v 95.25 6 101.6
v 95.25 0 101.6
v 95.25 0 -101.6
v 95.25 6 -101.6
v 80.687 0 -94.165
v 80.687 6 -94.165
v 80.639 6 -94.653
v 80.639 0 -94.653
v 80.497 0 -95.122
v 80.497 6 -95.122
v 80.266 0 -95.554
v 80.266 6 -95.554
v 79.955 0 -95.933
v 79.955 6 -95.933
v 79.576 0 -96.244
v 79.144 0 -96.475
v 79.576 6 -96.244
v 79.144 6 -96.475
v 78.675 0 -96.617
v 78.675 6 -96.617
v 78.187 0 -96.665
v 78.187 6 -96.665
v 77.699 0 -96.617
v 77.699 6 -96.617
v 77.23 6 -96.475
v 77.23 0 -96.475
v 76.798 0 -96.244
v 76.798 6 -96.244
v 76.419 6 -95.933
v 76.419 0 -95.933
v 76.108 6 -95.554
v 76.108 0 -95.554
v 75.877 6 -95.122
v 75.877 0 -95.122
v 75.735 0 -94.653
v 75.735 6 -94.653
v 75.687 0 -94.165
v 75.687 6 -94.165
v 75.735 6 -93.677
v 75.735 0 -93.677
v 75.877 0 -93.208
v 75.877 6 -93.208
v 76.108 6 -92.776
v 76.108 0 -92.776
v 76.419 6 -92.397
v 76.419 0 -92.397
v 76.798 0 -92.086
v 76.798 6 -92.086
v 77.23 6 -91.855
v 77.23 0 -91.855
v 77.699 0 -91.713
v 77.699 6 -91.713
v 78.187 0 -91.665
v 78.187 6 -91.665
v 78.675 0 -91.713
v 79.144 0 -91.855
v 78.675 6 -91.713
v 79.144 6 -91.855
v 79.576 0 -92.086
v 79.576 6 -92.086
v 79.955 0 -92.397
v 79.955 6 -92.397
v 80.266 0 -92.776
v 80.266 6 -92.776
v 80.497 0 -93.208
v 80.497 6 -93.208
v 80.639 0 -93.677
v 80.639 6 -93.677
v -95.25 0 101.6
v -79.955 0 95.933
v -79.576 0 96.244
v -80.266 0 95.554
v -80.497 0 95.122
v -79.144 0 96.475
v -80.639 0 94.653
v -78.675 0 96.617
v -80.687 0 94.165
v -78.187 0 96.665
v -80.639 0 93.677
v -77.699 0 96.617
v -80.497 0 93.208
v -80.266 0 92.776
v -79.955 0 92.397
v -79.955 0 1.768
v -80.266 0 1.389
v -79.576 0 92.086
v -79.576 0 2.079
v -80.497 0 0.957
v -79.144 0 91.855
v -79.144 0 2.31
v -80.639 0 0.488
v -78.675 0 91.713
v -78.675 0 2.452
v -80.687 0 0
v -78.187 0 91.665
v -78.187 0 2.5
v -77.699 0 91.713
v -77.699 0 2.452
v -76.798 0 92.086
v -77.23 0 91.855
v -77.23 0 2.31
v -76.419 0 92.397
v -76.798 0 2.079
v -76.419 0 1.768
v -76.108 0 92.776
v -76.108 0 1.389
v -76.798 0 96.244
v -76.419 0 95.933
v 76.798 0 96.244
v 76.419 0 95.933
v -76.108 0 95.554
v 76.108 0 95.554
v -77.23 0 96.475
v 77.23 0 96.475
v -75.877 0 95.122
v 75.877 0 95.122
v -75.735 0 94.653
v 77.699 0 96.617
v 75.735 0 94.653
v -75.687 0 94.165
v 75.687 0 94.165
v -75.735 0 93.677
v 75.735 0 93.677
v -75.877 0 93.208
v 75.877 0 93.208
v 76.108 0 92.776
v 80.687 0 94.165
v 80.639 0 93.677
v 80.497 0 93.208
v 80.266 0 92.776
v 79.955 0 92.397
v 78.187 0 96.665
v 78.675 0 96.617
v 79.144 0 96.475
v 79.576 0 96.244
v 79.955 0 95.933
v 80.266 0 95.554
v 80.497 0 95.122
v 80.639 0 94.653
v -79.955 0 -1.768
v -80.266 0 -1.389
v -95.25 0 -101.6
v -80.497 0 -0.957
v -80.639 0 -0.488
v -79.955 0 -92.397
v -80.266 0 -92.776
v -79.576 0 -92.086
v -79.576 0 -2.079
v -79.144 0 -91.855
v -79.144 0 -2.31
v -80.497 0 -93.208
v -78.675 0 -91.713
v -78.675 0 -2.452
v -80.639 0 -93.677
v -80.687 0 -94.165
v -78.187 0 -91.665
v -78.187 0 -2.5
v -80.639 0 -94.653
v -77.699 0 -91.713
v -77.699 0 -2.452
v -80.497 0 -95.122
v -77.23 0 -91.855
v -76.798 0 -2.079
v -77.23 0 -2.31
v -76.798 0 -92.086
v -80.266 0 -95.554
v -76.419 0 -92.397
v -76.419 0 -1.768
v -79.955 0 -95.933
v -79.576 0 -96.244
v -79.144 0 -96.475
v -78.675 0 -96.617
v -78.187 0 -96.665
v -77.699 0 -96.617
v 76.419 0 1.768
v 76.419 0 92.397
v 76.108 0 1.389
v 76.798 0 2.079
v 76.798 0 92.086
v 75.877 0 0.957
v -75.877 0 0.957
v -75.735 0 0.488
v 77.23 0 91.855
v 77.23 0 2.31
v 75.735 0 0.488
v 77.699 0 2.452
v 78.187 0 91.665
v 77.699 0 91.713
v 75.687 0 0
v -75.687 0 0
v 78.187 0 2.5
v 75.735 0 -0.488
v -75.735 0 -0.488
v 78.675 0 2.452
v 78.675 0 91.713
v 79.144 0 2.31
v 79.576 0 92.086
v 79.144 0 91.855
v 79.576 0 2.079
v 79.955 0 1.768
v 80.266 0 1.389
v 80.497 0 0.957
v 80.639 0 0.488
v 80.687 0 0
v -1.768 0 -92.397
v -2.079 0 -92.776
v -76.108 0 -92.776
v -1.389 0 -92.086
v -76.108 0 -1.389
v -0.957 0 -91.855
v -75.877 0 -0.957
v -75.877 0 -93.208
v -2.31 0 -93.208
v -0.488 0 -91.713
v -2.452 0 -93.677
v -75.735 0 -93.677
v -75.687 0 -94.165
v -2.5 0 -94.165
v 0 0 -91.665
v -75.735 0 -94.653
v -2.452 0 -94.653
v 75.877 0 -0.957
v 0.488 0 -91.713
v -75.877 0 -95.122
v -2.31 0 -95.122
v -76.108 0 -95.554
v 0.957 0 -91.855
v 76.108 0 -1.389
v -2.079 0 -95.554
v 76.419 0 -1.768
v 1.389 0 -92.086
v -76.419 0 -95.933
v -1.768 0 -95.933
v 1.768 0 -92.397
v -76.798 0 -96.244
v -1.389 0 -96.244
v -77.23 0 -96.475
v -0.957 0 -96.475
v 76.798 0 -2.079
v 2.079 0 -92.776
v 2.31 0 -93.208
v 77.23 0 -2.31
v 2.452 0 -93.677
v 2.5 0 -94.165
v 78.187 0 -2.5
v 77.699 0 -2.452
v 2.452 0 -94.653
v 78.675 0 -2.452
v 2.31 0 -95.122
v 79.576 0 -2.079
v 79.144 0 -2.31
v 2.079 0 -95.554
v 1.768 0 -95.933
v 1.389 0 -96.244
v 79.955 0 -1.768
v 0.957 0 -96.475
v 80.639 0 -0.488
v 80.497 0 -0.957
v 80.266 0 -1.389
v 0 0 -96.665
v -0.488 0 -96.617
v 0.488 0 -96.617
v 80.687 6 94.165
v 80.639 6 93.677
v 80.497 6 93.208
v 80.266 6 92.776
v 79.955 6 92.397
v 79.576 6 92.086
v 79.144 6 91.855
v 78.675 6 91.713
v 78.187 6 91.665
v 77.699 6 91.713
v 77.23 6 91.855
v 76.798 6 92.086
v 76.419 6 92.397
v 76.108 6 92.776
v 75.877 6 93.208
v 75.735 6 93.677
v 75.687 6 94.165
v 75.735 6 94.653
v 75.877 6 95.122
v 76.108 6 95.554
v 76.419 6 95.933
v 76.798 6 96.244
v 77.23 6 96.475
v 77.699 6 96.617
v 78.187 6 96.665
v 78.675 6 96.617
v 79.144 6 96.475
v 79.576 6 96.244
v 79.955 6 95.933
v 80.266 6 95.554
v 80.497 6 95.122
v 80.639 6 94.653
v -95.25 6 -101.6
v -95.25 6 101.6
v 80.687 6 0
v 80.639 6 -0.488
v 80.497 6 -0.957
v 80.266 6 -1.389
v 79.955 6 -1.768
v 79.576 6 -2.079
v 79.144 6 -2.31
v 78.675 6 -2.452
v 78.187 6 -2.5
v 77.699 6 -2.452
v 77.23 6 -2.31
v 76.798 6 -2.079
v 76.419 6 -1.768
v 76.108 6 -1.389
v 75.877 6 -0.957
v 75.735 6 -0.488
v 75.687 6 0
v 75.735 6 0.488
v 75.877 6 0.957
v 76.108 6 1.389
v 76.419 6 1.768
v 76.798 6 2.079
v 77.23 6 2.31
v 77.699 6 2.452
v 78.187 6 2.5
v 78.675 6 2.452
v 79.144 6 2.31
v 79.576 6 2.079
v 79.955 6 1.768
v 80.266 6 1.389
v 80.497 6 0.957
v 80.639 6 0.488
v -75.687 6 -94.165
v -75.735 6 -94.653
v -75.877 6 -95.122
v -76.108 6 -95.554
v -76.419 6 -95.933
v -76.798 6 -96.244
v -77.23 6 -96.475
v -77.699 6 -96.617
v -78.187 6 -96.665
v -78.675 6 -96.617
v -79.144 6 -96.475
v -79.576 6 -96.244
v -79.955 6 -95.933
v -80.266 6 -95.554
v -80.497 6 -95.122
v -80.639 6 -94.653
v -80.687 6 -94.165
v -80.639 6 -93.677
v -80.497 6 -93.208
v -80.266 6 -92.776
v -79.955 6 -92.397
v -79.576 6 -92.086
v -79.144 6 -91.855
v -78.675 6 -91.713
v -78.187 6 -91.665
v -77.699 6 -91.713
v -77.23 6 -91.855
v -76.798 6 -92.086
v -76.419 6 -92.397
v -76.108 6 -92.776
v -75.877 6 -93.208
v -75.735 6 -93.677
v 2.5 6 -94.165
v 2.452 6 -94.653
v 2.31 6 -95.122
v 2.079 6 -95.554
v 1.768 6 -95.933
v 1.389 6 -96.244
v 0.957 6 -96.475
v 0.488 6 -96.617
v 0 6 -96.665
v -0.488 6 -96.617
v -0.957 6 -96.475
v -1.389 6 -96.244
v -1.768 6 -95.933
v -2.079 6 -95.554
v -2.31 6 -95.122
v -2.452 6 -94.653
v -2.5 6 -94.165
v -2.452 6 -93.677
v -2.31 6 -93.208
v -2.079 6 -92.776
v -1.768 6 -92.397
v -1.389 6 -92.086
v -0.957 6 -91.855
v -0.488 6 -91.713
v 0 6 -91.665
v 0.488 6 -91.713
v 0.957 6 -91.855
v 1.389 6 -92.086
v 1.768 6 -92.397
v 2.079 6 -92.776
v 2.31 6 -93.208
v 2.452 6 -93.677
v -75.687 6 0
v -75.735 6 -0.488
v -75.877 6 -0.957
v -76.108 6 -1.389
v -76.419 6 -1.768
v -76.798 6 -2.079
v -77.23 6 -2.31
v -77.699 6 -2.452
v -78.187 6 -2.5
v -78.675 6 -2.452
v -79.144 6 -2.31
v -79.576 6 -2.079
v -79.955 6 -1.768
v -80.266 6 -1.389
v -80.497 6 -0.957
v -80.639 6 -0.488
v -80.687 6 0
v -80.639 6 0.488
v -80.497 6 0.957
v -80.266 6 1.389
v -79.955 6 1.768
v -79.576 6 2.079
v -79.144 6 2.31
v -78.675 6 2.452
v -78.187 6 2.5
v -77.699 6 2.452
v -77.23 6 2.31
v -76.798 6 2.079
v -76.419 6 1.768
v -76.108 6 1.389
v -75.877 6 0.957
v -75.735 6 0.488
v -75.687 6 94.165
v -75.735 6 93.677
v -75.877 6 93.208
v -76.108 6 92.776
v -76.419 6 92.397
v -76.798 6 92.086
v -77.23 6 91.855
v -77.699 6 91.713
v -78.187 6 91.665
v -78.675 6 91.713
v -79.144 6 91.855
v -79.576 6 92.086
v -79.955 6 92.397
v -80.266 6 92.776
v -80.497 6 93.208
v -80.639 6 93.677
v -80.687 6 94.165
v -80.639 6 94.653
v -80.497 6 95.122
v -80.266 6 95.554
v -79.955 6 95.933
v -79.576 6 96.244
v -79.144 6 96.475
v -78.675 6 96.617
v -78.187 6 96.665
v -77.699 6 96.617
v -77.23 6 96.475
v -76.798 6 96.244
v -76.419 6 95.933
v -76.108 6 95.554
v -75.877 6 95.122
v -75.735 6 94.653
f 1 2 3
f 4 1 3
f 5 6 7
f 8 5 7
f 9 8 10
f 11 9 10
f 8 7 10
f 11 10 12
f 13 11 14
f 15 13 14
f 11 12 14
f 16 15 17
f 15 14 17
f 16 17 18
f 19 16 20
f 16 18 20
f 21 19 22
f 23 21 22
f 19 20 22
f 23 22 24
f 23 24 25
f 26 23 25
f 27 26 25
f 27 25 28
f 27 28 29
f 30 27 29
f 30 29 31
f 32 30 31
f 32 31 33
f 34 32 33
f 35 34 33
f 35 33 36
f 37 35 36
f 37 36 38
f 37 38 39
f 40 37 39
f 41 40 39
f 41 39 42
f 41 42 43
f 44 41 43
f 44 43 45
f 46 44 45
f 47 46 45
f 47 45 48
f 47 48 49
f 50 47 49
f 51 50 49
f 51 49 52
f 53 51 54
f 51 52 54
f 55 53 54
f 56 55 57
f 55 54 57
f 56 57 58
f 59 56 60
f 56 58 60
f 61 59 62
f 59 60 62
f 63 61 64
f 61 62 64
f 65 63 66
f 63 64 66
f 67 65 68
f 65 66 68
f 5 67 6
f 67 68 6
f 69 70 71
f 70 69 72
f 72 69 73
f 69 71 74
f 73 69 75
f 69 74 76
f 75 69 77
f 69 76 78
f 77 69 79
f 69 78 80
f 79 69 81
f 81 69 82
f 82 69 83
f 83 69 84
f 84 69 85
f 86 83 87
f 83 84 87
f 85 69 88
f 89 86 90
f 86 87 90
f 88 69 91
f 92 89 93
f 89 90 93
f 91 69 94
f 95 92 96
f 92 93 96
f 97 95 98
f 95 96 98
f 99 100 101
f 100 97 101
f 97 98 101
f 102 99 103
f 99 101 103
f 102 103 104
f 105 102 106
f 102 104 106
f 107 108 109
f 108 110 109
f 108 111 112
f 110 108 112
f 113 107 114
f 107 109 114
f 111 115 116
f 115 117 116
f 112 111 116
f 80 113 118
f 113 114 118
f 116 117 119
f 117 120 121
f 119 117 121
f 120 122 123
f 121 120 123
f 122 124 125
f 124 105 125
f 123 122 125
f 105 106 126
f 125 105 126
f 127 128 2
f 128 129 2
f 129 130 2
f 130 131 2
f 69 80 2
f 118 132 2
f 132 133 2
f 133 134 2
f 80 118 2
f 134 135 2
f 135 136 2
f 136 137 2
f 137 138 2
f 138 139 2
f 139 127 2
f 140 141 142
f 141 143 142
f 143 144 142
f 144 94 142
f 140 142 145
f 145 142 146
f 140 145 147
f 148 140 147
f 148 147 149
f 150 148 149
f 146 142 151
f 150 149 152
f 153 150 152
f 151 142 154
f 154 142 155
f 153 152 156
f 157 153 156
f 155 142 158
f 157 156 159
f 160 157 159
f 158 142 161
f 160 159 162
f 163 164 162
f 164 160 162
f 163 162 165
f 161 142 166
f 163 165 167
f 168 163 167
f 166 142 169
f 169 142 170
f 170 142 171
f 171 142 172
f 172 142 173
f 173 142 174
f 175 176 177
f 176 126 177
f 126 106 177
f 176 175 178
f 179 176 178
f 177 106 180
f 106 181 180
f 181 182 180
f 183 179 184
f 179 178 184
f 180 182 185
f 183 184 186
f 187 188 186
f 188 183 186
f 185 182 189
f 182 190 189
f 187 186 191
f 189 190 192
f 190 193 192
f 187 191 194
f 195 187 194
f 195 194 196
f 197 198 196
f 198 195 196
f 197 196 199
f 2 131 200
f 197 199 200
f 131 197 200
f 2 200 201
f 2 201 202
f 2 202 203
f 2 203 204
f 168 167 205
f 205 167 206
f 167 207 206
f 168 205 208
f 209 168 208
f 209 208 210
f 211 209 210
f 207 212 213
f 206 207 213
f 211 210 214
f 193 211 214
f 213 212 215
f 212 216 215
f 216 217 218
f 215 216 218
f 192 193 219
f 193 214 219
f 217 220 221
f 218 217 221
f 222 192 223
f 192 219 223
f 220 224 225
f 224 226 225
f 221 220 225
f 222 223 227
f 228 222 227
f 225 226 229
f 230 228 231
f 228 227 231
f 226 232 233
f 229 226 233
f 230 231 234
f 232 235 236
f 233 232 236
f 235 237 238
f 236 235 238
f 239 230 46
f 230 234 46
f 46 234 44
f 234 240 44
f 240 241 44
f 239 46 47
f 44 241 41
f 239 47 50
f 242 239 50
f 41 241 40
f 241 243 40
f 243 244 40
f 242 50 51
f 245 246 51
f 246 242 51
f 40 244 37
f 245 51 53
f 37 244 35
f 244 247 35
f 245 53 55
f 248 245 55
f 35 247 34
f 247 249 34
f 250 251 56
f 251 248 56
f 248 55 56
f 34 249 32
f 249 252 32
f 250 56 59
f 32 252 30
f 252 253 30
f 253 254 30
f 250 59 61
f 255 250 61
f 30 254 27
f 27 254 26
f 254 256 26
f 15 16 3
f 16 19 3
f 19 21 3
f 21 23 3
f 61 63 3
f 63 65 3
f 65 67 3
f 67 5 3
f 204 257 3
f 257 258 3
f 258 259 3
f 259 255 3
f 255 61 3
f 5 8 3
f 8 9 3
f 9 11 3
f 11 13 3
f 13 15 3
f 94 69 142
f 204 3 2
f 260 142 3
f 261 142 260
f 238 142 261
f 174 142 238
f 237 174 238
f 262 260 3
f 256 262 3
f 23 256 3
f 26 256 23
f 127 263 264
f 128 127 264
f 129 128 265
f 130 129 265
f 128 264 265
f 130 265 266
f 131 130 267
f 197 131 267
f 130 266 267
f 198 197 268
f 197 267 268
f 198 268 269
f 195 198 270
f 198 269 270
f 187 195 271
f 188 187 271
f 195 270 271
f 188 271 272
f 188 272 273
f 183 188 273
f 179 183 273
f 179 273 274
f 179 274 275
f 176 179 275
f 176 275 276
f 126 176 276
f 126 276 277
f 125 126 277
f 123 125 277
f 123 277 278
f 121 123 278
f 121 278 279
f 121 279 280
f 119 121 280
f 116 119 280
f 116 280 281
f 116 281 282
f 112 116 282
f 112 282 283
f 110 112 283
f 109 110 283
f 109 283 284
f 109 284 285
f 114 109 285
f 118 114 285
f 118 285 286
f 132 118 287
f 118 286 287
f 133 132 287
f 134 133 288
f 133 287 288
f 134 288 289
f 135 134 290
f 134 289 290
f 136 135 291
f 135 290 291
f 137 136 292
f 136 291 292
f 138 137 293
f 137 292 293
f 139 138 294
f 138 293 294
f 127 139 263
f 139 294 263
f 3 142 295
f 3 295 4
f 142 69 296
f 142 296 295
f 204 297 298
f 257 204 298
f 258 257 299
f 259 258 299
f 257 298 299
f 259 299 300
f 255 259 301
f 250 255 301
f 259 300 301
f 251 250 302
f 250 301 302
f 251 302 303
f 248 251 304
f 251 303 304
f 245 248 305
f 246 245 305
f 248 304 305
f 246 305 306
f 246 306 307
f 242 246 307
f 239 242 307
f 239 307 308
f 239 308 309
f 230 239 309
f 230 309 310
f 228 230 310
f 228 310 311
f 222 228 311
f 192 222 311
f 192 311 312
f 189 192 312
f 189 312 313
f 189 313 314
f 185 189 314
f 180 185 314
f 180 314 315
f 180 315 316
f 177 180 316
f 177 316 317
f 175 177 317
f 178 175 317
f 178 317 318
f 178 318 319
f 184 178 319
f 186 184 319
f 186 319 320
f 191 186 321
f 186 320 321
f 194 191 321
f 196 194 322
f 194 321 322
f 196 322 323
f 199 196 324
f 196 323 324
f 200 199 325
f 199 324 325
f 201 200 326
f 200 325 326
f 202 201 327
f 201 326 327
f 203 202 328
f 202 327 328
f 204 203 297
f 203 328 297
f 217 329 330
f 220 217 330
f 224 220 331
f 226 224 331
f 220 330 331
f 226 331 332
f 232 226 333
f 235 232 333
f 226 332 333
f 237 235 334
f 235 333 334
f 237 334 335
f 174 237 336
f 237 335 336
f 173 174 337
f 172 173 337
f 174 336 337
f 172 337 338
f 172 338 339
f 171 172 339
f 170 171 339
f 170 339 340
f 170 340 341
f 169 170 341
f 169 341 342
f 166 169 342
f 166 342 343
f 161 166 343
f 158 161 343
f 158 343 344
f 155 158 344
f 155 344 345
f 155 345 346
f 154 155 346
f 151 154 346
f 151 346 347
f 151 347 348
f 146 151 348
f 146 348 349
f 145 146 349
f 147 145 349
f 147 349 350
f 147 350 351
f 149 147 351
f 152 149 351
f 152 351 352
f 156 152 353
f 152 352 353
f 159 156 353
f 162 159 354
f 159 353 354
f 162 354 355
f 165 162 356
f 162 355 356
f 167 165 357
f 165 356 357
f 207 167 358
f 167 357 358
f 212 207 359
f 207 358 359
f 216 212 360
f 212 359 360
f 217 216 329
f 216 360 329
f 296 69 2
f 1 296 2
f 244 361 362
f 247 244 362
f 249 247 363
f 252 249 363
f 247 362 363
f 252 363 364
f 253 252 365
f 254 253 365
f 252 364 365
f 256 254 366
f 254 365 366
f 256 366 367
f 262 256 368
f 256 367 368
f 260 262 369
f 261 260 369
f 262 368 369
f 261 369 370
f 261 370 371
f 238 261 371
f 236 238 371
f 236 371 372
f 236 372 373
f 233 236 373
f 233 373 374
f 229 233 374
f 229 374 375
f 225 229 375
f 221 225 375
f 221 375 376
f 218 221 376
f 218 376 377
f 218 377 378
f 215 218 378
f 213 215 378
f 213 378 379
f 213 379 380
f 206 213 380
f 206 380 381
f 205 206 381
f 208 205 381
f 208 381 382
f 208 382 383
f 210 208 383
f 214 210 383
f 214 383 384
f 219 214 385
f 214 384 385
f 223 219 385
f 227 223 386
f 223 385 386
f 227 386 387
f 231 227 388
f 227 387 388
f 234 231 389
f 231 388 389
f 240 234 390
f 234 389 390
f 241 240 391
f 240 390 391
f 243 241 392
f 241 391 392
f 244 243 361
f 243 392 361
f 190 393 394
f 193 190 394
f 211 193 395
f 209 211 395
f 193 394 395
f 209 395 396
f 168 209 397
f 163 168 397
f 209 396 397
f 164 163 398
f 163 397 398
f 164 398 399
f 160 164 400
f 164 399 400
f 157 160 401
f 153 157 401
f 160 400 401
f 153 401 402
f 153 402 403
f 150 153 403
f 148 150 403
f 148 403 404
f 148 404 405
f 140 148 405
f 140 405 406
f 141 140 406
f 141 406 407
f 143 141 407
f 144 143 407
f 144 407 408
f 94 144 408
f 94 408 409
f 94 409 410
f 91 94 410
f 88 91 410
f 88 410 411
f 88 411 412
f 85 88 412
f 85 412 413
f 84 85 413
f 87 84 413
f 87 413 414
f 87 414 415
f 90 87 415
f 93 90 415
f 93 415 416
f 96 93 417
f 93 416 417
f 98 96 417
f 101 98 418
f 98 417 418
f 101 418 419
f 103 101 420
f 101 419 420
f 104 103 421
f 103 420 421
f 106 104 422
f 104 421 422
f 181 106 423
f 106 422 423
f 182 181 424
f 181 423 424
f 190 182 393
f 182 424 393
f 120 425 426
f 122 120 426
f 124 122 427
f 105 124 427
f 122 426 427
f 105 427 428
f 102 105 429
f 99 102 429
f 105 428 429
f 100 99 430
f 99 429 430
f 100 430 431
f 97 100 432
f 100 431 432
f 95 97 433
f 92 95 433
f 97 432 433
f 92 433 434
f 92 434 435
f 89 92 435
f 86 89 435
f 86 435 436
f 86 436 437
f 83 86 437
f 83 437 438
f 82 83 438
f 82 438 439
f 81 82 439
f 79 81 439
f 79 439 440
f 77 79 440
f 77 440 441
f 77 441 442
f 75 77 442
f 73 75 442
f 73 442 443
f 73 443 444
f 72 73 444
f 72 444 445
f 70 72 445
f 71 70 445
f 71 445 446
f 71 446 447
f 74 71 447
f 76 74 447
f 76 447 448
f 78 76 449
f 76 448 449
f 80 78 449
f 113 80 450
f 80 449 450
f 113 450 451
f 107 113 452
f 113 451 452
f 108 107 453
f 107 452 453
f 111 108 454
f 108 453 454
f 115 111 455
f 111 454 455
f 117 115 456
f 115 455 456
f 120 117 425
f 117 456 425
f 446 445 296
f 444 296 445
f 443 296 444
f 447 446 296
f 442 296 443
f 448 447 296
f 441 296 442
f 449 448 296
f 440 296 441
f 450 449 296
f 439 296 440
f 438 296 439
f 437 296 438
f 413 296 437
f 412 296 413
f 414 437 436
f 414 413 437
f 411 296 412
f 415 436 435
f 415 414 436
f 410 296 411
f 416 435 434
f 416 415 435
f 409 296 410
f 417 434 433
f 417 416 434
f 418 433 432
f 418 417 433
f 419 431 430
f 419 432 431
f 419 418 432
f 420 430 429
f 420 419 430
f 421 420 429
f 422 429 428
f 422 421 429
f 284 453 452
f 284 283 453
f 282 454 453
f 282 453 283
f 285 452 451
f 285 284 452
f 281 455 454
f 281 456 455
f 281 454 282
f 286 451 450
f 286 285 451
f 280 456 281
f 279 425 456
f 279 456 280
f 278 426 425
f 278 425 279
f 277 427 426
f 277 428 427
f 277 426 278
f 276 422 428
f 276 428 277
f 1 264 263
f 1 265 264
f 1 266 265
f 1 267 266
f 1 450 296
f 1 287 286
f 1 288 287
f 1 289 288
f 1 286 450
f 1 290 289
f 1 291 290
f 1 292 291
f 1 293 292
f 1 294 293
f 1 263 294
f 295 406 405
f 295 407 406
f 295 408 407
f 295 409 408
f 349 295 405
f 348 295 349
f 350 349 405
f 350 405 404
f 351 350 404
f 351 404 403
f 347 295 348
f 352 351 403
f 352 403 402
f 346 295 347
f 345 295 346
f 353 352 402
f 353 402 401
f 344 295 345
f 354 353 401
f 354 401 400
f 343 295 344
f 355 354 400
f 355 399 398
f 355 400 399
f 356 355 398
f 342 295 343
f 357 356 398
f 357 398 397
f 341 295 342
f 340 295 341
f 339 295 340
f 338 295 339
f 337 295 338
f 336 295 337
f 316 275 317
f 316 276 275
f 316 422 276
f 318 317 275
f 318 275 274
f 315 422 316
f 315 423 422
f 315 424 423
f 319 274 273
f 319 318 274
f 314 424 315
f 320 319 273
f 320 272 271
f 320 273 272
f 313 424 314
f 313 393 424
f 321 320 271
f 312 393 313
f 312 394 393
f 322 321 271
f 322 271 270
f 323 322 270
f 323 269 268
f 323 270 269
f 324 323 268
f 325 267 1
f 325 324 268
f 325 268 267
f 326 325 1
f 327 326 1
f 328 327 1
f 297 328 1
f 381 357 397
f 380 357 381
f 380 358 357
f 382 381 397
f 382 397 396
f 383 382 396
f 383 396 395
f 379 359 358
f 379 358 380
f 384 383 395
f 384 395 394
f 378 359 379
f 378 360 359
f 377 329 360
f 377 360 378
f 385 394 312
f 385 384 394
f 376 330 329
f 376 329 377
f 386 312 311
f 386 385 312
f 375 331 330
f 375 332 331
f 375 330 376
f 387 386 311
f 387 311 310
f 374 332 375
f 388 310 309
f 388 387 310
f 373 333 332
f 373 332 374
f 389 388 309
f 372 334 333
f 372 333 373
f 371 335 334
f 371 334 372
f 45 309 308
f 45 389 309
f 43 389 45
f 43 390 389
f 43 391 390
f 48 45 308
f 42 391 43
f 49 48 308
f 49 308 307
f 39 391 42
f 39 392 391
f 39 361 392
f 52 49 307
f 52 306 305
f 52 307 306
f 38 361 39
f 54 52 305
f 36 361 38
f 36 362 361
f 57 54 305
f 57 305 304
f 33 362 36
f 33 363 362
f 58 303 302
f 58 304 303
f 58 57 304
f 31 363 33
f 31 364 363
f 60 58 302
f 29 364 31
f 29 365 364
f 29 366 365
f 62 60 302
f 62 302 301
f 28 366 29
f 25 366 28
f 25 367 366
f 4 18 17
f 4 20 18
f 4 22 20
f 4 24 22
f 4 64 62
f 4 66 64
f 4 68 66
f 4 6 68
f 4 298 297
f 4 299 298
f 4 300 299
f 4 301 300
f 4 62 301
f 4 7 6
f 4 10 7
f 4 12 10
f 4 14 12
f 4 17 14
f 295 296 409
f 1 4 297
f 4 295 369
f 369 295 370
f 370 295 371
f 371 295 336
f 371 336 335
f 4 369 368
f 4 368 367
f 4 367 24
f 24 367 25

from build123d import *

# Parameters (mm, degrees)
SKETCH2_W           = 190.5
SKETCH2_H           = 203.2
BOSS_EXTRUDE1_DEPTH = 6
SKETCH5_R           = 2.5
CUT_EXTRUDE6_DEPTH  = 7


with BuildPart() as part:
    # Sketch2 → Boss-Extrude1 (new body)
    with BuildSketch(Plane(origin=(0, 0, 0), x_dir=(1, 0, 0), z_dir=(0, 1, 0))):
        Rectangle(SKETCH2_W, SKETCH2_H)
    extrude(amount=BOSS_EXTRUDE1_DEPTH)

    # Sketch5 → Cut-Extrude6 (cut, through all)
    with BuildSketch(Plane(origin=(0, 6, 0), x_dir=(1, 0, 0), z_dir=(0, 1, 0))):
        with Locations((-78.187036158, 94.165073798)):
            Circle(SKETCH5_R)
        with Locations((0, 94.165073798)):
            Circle(SKETCH5_R)
        with Locations((78.187036158, 0)):
            Circle(SKETCH5_R)
        with Locations((-78.187036158, 0)):
            Circle(SKETCH5_R)
        with Locations((78.187036158, 94.165073798)):
            Circle(SKETCH5_R)
        with Locations((-78.187036158, -94.165073798)):
            Circle(SKETCH5_R)
        with Locations((78.187036158, -94.165073798)):
            Circle(SKETCH5_R)
    extrude(amount=-CUT_EXTRUDE6_DEPTH, mode=Mode.SUBTRACT)


solid = part.part
